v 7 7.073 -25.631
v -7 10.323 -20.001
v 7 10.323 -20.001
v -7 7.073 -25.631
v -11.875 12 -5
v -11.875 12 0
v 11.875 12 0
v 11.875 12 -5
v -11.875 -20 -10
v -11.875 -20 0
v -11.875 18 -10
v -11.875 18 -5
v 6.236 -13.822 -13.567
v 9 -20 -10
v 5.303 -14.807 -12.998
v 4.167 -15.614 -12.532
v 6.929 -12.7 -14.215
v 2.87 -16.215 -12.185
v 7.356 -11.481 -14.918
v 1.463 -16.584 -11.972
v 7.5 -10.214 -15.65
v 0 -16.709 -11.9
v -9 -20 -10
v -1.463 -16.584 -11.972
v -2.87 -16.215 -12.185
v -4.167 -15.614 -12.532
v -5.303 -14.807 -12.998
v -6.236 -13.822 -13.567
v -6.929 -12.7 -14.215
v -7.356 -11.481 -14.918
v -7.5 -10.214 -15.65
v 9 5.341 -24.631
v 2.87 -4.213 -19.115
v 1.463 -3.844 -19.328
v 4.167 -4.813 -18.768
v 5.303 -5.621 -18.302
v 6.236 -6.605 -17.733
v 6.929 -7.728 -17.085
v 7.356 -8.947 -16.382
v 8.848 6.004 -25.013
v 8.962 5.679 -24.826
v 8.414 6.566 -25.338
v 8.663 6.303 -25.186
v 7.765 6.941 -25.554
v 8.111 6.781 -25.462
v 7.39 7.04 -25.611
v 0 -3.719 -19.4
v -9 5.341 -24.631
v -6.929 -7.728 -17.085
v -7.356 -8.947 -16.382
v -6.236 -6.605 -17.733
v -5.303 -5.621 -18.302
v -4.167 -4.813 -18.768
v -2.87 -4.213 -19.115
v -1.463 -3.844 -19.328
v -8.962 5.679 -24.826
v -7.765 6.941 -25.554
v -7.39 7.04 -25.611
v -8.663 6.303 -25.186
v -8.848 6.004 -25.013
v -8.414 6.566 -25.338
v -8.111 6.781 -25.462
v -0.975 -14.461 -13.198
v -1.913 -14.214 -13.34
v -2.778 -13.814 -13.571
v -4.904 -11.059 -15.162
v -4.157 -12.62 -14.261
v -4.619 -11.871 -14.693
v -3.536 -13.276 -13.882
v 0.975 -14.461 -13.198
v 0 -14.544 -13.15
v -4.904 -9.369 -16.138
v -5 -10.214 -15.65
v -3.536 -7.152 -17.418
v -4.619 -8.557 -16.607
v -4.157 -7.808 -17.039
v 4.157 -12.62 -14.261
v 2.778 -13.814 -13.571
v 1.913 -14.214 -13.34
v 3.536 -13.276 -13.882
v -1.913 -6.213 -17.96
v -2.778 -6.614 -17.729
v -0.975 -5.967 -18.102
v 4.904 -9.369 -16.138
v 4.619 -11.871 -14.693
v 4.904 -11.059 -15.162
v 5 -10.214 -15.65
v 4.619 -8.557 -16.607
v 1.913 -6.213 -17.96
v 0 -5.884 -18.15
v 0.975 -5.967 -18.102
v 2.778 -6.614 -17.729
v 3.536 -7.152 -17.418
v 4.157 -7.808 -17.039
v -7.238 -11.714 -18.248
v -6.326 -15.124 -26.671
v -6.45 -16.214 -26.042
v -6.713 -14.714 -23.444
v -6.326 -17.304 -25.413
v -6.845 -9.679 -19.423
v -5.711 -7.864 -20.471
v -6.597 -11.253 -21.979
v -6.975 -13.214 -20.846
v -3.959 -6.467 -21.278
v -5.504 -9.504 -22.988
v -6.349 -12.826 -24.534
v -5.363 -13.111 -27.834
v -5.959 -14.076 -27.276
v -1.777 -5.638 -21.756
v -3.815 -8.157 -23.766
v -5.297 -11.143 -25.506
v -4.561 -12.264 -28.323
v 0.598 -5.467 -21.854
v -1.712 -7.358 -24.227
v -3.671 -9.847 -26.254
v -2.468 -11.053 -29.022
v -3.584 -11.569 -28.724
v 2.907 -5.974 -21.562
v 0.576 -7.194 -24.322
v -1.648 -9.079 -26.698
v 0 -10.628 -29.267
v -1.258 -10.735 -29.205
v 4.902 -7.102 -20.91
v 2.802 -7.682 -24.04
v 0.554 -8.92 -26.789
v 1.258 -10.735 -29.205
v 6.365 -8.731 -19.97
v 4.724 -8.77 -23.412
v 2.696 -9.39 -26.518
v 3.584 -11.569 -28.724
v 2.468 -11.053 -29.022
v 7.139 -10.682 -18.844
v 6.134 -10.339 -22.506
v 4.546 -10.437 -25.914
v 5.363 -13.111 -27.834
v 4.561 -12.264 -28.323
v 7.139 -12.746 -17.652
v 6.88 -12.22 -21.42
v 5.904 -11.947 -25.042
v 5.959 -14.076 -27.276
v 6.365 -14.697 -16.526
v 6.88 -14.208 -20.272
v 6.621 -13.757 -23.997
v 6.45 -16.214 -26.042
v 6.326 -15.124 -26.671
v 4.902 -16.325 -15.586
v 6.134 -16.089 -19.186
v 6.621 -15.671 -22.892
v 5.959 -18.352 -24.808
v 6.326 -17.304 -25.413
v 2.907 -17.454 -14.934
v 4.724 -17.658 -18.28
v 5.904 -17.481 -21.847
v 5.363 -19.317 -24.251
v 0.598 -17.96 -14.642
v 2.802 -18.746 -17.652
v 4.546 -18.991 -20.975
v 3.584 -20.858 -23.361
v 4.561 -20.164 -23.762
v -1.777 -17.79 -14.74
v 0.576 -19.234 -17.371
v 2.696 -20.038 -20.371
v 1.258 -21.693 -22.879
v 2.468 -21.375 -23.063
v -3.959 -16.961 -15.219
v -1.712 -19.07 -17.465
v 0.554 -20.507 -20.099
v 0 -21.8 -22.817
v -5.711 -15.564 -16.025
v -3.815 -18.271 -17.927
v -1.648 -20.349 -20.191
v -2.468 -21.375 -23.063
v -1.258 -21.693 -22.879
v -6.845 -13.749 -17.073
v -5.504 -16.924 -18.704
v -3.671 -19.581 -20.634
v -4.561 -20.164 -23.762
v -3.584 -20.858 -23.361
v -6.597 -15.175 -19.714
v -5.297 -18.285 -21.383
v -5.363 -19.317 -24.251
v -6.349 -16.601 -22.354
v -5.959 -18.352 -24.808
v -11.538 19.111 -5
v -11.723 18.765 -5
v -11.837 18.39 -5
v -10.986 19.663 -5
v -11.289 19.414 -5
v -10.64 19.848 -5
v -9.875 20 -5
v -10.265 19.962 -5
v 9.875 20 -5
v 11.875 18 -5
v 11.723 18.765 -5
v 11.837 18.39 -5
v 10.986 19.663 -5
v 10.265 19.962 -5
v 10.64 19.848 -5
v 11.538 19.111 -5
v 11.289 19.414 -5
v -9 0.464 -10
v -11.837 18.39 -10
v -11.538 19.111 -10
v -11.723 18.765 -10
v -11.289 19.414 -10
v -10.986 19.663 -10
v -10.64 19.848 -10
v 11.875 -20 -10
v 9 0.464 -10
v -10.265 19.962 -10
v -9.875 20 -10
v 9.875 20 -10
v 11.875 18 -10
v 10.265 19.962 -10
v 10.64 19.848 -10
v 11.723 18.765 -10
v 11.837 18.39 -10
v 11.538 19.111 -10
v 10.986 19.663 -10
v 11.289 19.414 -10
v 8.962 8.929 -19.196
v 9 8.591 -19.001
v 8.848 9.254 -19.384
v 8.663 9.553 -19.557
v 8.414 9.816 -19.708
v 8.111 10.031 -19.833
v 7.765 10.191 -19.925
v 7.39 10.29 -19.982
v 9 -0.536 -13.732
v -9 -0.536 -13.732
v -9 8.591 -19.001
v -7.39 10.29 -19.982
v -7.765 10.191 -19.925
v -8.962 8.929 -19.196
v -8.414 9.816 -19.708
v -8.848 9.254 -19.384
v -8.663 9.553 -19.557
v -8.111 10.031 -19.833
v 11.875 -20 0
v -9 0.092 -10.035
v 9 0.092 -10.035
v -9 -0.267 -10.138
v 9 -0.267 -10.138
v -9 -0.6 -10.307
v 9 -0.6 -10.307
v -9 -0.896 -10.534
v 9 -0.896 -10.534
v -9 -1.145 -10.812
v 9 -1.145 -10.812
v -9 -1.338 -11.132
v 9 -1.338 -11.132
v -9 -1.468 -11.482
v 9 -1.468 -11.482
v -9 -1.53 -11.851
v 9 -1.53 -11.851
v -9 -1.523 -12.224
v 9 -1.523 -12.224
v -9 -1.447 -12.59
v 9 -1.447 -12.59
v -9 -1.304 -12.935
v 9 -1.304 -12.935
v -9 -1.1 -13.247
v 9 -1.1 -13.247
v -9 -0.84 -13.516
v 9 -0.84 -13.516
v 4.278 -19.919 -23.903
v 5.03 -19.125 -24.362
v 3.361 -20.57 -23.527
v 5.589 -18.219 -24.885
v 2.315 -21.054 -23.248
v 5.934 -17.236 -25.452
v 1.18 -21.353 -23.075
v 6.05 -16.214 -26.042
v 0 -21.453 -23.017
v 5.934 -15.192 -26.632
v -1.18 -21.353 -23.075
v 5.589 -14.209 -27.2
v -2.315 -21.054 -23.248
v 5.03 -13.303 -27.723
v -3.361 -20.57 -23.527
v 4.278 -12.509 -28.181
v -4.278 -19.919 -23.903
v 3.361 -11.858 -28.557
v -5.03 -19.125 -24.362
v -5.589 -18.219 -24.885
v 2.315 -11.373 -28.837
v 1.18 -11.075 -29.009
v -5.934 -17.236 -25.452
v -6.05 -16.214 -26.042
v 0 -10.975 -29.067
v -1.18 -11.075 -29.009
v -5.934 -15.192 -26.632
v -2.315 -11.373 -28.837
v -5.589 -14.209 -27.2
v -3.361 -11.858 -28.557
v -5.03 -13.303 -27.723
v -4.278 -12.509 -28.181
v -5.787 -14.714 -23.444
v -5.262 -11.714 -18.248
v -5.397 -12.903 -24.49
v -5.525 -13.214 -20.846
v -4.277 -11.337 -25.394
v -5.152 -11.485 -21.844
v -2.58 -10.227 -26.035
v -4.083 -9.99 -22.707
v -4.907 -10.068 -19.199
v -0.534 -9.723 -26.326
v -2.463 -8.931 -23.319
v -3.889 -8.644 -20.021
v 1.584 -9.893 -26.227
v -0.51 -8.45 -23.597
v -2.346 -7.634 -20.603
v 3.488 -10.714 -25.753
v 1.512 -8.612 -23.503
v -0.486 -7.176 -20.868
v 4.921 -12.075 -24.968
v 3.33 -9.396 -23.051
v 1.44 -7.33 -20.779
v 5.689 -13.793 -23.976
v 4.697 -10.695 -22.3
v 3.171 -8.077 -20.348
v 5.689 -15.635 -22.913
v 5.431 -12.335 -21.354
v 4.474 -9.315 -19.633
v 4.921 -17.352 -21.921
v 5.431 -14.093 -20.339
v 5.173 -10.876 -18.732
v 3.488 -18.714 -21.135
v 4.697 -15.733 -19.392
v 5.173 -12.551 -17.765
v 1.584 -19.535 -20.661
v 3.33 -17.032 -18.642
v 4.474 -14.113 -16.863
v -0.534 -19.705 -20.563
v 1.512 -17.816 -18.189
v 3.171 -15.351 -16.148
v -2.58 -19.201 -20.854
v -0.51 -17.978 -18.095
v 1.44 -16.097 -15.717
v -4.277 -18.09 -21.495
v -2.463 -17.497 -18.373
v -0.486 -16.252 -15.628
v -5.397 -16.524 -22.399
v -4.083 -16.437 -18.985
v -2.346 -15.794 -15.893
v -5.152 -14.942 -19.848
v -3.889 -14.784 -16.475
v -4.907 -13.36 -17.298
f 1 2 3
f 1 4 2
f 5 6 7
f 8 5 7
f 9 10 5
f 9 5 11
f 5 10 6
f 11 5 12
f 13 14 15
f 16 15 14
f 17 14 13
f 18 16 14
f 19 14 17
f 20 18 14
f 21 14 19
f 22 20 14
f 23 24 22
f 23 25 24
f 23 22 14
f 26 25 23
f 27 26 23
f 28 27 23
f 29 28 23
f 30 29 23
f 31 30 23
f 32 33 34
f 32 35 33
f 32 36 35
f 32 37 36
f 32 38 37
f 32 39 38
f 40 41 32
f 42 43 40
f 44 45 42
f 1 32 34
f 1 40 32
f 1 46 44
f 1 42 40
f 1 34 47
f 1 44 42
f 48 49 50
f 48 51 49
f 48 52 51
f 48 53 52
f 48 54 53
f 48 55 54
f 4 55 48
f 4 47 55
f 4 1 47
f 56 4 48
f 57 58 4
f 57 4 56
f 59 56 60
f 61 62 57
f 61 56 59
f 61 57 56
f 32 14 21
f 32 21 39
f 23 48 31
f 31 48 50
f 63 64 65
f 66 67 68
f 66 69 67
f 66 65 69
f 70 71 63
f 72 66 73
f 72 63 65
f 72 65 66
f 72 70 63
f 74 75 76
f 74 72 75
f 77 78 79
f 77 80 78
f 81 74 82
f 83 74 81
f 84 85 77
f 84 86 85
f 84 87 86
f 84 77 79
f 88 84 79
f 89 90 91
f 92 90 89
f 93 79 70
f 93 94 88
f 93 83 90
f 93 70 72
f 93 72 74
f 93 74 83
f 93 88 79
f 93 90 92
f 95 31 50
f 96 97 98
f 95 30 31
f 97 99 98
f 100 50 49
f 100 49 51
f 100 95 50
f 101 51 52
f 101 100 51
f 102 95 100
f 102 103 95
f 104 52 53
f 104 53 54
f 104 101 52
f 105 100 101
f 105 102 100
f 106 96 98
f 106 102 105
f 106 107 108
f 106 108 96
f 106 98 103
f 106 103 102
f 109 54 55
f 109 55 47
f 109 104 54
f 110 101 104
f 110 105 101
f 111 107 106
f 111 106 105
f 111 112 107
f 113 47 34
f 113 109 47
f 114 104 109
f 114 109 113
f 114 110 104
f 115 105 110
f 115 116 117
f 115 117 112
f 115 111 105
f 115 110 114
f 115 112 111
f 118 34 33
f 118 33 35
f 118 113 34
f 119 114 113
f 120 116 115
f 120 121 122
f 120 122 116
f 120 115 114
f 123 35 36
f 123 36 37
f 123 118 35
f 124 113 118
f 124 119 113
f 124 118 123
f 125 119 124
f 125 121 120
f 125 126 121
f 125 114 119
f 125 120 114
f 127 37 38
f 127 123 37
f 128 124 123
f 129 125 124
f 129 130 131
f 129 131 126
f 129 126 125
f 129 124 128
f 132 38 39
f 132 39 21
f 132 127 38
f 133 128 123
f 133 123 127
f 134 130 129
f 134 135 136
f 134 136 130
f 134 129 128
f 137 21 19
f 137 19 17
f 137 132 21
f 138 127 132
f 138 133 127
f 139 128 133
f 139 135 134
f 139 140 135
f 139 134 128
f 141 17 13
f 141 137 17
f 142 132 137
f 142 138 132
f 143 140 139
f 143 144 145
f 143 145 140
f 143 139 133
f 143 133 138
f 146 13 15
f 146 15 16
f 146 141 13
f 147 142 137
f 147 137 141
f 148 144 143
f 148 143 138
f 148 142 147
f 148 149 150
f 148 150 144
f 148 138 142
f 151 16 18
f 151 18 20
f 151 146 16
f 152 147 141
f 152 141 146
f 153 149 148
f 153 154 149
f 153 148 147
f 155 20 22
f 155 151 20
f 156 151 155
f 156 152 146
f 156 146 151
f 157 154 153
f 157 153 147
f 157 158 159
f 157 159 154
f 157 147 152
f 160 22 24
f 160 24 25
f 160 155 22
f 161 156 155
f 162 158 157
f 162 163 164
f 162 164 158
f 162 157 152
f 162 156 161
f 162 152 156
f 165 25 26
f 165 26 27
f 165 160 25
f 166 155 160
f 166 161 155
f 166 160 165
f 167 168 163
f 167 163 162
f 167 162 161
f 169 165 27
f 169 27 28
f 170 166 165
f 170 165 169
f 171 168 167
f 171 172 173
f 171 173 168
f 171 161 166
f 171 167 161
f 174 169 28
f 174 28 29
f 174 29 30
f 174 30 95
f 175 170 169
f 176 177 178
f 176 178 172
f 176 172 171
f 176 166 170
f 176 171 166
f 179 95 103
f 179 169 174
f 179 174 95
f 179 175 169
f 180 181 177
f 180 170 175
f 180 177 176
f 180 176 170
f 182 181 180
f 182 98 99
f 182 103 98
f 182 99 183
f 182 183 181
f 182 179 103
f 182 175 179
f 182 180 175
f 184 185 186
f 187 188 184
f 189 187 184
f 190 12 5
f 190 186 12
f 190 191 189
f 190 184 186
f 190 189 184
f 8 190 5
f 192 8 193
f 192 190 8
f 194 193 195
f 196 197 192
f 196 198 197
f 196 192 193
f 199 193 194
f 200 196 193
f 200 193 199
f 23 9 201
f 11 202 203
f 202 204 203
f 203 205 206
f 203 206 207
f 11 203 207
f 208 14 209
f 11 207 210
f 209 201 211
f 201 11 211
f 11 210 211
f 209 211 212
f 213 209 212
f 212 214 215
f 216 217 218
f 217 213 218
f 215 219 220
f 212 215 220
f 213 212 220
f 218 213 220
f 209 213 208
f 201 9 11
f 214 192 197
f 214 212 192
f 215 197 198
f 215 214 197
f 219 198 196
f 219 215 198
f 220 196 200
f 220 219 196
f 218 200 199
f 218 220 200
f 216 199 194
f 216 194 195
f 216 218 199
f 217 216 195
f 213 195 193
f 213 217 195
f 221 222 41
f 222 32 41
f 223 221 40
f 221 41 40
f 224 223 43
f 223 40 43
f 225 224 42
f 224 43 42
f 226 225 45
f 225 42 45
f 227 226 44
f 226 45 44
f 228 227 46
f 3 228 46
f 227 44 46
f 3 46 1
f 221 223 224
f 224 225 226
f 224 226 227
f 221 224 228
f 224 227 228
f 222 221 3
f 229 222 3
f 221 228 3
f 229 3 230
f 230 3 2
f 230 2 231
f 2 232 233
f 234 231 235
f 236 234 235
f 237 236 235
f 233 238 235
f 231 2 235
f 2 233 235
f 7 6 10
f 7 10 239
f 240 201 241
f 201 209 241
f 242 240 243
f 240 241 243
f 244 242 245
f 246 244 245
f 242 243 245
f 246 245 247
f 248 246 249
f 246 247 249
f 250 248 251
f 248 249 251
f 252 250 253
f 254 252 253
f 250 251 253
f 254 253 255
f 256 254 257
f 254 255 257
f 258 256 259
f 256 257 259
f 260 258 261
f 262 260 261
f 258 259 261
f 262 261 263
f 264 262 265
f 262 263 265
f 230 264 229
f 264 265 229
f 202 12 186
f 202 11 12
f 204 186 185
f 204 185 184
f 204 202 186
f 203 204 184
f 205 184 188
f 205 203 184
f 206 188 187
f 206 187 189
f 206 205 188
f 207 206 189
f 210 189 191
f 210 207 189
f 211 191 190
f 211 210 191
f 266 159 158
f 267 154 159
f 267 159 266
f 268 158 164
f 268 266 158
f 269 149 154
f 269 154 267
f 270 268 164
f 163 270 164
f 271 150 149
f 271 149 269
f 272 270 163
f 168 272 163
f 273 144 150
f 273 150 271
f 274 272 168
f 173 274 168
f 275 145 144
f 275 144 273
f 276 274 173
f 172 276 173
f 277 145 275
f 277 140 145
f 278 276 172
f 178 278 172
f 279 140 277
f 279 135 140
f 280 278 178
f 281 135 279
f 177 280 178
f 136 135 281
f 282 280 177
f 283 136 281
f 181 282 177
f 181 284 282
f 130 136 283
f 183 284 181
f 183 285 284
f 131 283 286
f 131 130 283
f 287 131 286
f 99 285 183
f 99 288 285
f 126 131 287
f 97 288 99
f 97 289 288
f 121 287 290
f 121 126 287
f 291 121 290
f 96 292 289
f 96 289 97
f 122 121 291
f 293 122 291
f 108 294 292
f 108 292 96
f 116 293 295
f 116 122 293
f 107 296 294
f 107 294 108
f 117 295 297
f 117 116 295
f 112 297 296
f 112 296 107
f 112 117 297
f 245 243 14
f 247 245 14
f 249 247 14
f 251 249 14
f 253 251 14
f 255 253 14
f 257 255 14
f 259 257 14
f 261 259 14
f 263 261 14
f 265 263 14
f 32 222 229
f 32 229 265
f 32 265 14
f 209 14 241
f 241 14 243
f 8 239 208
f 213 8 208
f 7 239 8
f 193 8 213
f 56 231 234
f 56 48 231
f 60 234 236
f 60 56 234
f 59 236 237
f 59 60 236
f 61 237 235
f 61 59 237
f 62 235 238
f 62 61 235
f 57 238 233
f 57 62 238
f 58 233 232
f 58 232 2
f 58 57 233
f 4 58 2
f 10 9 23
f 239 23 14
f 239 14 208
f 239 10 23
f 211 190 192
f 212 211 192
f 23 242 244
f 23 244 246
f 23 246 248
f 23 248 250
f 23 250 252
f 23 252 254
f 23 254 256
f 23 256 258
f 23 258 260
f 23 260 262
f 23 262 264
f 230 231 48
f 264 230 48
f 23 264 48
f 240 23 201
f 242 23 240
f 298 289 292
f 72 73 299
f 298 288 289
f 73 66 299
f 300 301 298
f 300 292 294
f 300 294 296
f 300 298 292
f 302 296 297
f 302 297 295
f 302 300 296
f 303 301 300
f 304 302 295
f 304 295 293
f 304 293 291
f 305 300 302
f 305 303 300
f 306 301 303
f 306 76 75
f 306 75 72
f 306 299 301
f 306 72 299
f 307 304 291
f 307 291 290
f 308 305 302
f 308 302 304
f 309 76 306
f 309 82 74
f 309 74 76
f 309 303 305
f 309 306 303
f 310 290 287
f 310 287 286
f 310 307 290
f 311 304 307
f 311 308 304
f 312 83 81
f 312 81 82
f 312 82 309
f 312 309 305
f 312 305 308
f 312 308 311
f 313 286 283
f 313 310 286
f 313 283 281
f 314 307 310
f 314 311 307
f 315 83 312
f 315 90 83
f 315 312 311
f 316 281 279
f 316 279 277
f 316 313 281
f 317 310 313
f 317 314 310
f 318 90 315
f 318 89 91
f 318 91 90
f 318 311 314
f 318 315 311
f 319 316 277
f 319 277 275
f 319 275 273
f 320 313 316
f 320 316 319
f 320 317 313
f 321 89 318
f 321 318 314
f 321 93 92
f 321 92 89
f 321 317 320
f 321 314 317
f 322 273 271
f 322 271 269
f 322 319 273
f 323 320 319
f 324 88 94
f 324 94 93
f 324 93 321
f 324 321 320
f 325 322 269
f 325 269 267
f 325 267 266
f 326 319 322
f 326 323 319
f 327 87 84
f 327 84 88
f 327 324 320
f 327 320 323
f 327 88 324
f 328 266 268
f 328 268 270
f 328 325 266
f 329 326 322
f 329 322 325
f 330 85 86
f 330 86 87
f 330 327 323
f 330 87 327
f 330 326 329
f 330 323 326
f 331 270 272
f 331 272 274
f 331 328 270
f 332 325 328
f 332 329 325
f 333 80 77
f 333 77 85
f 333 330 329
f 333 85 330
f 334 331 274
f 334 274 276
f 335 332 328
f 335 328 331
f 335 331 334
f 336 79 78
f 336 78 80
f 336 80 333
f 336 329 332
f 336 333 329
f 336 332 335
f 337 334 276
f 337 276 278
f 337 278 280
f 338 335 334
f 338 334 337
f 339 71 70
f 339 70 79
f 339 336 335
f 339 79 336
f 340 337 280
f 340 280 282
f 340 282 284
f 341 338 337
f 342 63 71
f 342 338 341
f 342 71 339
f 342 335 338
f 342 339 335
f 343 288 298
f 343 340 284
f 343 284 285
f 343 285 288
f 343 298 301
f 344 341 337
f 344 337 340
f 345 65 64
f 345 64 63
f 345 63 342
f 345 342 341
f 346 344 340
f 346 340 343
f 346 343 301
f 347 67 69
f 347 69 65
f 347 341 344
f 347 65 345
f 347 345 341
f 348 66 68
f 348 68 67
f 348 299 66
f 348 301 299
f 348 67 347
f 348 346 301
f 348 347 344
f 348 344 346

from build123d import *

# Parameters (mm, degrees)
SKETCH1_W           = 23.75
SKETCH1_H           = 40
BOSS_EXTRUDE1_DEPTH = 10
SKETCH2_W           = 23.75
SKETCH2_H           = 8
CUT_EXTRUDE1_DEPTH  = 5
FILLET1_R           = 2
BOSS_EXTRUDE3_REACH = 44.573
SKETCH6_W           = 18
SKETCH6_H           = 6.5
SKETCH7_W           = 18
SKETCH7_H           = 6.5
CUT_EXTRUDE2_DEPTH  = 3.38
FILLET4_R           = 2
SKETCH8_R           = 7.5
BOSS_EXTRUDE4_DEPTH = 12
BOSS_EXTRUDE4_TAPER = 5
SKETCH9_R           = 5
CUT_EXTRUDE4_DEPTH  = 12
SKETCH10_R          = 5
CUT_EXTRUDE5_DEPTH  = 12
CUT_EXTRUDE5_DRAFT  = -5


with BuildPart() as part:
    # Sketch1 → Boss-Extrude1 (new body)
    with BuildSketch(Plane.XY):
        Rectangle(SKETCH1_W, SKETCH1_H)
    extrude(amount=-BOSS_EXTRUDE1_DEPTH)

    # Sketch2 → Cut-Extrude1 (cut)
    with BuildSketch(Plane.XY):
        with Locations((0, 16)):
            Rectangle(SKETCH2_W, SKETCH2_H)
    extrude(amount=-CUT_EXTRUDE1_DEPTH, mode=Mode.SUBTRACT)

    # Fillet1
    fillet1_edges = [part.edges().sort_by_distance(p)[0] for p in [
        (-11.875, 20, -7.5),
        (11.875, 20, -7.5),
    ]]
    fillet(fillet1_edges, radius=FILLET1_R)

    # Boss-Extrude3: up to this plane
    boss_extrude3_end = Plane(origin=(0, 0, -10), z_dir=(0, 0, -1))
    # Sketch6 → Boss-Extrude3 (add, up to the surface)
    with BuildSketch(Plane(origin=(0, 19.330127019, -11.160254038), x_dir=(-1, 0, 0), z_dir=(0, -0.866025403784438, 0.500000000000001)), mode=Mode.PRIVATE) as boss_extrude3_sk1:
        with Locations((0, 15.410254038)):
            Rectangle(SKETCH6_W, SKETCH6_H)
    boss_extrude3_tool1 = split(extrude(boss_extrude3_sk1.sketch, amount=BOSS_EXTRUDE3_REACH, mode=Mode.PRIVATE), bisect_by=boss_extrude3_end, keep=Keep.BOTH, mode=Mode.PRIVATE)
    add(boss_extrude3_tool1.solids().sort_by_distance((0, 11.625, -24.505926))[0])

    # Sketch7 → Cut-Extrude2 (cut)
    with BuildSketch(Plane(origin=(0, 19.330127019, -11.160254038), x_dir=(1, 0, 0), z_dir=(0, 0.866025403784438, -0.5000000000000012))):
        with Locations((0, 15.410254038)):
            Rectangle(SKETCH7_W, SKETCH7_H)
    extrude(amount=-CUT_EXTRUDE2_DEPTH, mode=Mode.SUBTRACT)

    # Fillet4
    fillet4_edges = [part.edges().sort_by_distance(p)[0] for p in [
        (0, -7, -10),
        (9, 8.697834135, -22.815925513),
        (-9, 8.697834135, -22.815925513),
    ]]
    fillet(fillet4_edges, radius=FILLET4_R)

    # Sketch8 → Boss-Extrude4 (add)
    with BuildSketch(Plane(origin=(0, -9.330127019, -16.160254038), x_dir=(-1, 0, 0), z_dir=(0, -0.500000000000001, -0.8660254037844382))):
        with Locations((0, -1.020508076)):
            Circle(SKETCH8_R)
    extrude(amount=BOSS_EXTRUDE4_DEPTH, taper=BOSS_EXTRUDE4_TAPER)

    # Sketch9 → Cut-Extrude4 (cut)
    with BuildSketch(Plane(origin=(0, -15.330127019, -26.552558883), x_dir=(-1, 0, 0), z_dir=(0, -0.5000000000000011, -0.8660254037844382))):
        with Locations(Location((0, -1.020508076, 0), (0, 0, 90))):
            Circle(SKETCH9_R)
    extrude(amount=-CUT_EXTRUDE4_DEPTH, mode=Mode.SUBTRACT)


with BuildPart() as cut_extrude5_tool:
    # Sketch10 → Cut-Extrude5 (with draft: the straight prism first)
    with BuildSketch(Plane(origin=(0, -9.330127019, -16.160254038), x_dir=(-1, 0, 0), z_dir=(0, -0.5000000000000012, -0.866025403784438))):
        with Locations((0, -1.020508076)):
            Circle(SKETCH10_R)
    extrude(amount=CUT_EXTRUDE5_DEPTH)
    # Cut-Extrude5: the draft: its side faces are tilted about the plane it starts from
    cut_extrude5_sides = [cut_extrude5_tool.faces().sort_by_distance(p)[0] for p in [
        (5, -13.213912937, -20.846152423),
    ]]
    draft(cut_extrude5_sides, Plane(origin=(0, -9.330127019, -16.160254038), x_dir=(-1, 0, 0), z_dir=(0, -0.5000000000000012, -0.866025403784438)), CUT_EXTRUDE5_DRAFT)


with BuildPart() as part_1:
    add(part.part)

    # Cut-Extrude5: cut by cut_extrude5_tool
    add(cut_extrude5_tool.part, mode=Mode.SUBTRACT)


solid = part_1.part
